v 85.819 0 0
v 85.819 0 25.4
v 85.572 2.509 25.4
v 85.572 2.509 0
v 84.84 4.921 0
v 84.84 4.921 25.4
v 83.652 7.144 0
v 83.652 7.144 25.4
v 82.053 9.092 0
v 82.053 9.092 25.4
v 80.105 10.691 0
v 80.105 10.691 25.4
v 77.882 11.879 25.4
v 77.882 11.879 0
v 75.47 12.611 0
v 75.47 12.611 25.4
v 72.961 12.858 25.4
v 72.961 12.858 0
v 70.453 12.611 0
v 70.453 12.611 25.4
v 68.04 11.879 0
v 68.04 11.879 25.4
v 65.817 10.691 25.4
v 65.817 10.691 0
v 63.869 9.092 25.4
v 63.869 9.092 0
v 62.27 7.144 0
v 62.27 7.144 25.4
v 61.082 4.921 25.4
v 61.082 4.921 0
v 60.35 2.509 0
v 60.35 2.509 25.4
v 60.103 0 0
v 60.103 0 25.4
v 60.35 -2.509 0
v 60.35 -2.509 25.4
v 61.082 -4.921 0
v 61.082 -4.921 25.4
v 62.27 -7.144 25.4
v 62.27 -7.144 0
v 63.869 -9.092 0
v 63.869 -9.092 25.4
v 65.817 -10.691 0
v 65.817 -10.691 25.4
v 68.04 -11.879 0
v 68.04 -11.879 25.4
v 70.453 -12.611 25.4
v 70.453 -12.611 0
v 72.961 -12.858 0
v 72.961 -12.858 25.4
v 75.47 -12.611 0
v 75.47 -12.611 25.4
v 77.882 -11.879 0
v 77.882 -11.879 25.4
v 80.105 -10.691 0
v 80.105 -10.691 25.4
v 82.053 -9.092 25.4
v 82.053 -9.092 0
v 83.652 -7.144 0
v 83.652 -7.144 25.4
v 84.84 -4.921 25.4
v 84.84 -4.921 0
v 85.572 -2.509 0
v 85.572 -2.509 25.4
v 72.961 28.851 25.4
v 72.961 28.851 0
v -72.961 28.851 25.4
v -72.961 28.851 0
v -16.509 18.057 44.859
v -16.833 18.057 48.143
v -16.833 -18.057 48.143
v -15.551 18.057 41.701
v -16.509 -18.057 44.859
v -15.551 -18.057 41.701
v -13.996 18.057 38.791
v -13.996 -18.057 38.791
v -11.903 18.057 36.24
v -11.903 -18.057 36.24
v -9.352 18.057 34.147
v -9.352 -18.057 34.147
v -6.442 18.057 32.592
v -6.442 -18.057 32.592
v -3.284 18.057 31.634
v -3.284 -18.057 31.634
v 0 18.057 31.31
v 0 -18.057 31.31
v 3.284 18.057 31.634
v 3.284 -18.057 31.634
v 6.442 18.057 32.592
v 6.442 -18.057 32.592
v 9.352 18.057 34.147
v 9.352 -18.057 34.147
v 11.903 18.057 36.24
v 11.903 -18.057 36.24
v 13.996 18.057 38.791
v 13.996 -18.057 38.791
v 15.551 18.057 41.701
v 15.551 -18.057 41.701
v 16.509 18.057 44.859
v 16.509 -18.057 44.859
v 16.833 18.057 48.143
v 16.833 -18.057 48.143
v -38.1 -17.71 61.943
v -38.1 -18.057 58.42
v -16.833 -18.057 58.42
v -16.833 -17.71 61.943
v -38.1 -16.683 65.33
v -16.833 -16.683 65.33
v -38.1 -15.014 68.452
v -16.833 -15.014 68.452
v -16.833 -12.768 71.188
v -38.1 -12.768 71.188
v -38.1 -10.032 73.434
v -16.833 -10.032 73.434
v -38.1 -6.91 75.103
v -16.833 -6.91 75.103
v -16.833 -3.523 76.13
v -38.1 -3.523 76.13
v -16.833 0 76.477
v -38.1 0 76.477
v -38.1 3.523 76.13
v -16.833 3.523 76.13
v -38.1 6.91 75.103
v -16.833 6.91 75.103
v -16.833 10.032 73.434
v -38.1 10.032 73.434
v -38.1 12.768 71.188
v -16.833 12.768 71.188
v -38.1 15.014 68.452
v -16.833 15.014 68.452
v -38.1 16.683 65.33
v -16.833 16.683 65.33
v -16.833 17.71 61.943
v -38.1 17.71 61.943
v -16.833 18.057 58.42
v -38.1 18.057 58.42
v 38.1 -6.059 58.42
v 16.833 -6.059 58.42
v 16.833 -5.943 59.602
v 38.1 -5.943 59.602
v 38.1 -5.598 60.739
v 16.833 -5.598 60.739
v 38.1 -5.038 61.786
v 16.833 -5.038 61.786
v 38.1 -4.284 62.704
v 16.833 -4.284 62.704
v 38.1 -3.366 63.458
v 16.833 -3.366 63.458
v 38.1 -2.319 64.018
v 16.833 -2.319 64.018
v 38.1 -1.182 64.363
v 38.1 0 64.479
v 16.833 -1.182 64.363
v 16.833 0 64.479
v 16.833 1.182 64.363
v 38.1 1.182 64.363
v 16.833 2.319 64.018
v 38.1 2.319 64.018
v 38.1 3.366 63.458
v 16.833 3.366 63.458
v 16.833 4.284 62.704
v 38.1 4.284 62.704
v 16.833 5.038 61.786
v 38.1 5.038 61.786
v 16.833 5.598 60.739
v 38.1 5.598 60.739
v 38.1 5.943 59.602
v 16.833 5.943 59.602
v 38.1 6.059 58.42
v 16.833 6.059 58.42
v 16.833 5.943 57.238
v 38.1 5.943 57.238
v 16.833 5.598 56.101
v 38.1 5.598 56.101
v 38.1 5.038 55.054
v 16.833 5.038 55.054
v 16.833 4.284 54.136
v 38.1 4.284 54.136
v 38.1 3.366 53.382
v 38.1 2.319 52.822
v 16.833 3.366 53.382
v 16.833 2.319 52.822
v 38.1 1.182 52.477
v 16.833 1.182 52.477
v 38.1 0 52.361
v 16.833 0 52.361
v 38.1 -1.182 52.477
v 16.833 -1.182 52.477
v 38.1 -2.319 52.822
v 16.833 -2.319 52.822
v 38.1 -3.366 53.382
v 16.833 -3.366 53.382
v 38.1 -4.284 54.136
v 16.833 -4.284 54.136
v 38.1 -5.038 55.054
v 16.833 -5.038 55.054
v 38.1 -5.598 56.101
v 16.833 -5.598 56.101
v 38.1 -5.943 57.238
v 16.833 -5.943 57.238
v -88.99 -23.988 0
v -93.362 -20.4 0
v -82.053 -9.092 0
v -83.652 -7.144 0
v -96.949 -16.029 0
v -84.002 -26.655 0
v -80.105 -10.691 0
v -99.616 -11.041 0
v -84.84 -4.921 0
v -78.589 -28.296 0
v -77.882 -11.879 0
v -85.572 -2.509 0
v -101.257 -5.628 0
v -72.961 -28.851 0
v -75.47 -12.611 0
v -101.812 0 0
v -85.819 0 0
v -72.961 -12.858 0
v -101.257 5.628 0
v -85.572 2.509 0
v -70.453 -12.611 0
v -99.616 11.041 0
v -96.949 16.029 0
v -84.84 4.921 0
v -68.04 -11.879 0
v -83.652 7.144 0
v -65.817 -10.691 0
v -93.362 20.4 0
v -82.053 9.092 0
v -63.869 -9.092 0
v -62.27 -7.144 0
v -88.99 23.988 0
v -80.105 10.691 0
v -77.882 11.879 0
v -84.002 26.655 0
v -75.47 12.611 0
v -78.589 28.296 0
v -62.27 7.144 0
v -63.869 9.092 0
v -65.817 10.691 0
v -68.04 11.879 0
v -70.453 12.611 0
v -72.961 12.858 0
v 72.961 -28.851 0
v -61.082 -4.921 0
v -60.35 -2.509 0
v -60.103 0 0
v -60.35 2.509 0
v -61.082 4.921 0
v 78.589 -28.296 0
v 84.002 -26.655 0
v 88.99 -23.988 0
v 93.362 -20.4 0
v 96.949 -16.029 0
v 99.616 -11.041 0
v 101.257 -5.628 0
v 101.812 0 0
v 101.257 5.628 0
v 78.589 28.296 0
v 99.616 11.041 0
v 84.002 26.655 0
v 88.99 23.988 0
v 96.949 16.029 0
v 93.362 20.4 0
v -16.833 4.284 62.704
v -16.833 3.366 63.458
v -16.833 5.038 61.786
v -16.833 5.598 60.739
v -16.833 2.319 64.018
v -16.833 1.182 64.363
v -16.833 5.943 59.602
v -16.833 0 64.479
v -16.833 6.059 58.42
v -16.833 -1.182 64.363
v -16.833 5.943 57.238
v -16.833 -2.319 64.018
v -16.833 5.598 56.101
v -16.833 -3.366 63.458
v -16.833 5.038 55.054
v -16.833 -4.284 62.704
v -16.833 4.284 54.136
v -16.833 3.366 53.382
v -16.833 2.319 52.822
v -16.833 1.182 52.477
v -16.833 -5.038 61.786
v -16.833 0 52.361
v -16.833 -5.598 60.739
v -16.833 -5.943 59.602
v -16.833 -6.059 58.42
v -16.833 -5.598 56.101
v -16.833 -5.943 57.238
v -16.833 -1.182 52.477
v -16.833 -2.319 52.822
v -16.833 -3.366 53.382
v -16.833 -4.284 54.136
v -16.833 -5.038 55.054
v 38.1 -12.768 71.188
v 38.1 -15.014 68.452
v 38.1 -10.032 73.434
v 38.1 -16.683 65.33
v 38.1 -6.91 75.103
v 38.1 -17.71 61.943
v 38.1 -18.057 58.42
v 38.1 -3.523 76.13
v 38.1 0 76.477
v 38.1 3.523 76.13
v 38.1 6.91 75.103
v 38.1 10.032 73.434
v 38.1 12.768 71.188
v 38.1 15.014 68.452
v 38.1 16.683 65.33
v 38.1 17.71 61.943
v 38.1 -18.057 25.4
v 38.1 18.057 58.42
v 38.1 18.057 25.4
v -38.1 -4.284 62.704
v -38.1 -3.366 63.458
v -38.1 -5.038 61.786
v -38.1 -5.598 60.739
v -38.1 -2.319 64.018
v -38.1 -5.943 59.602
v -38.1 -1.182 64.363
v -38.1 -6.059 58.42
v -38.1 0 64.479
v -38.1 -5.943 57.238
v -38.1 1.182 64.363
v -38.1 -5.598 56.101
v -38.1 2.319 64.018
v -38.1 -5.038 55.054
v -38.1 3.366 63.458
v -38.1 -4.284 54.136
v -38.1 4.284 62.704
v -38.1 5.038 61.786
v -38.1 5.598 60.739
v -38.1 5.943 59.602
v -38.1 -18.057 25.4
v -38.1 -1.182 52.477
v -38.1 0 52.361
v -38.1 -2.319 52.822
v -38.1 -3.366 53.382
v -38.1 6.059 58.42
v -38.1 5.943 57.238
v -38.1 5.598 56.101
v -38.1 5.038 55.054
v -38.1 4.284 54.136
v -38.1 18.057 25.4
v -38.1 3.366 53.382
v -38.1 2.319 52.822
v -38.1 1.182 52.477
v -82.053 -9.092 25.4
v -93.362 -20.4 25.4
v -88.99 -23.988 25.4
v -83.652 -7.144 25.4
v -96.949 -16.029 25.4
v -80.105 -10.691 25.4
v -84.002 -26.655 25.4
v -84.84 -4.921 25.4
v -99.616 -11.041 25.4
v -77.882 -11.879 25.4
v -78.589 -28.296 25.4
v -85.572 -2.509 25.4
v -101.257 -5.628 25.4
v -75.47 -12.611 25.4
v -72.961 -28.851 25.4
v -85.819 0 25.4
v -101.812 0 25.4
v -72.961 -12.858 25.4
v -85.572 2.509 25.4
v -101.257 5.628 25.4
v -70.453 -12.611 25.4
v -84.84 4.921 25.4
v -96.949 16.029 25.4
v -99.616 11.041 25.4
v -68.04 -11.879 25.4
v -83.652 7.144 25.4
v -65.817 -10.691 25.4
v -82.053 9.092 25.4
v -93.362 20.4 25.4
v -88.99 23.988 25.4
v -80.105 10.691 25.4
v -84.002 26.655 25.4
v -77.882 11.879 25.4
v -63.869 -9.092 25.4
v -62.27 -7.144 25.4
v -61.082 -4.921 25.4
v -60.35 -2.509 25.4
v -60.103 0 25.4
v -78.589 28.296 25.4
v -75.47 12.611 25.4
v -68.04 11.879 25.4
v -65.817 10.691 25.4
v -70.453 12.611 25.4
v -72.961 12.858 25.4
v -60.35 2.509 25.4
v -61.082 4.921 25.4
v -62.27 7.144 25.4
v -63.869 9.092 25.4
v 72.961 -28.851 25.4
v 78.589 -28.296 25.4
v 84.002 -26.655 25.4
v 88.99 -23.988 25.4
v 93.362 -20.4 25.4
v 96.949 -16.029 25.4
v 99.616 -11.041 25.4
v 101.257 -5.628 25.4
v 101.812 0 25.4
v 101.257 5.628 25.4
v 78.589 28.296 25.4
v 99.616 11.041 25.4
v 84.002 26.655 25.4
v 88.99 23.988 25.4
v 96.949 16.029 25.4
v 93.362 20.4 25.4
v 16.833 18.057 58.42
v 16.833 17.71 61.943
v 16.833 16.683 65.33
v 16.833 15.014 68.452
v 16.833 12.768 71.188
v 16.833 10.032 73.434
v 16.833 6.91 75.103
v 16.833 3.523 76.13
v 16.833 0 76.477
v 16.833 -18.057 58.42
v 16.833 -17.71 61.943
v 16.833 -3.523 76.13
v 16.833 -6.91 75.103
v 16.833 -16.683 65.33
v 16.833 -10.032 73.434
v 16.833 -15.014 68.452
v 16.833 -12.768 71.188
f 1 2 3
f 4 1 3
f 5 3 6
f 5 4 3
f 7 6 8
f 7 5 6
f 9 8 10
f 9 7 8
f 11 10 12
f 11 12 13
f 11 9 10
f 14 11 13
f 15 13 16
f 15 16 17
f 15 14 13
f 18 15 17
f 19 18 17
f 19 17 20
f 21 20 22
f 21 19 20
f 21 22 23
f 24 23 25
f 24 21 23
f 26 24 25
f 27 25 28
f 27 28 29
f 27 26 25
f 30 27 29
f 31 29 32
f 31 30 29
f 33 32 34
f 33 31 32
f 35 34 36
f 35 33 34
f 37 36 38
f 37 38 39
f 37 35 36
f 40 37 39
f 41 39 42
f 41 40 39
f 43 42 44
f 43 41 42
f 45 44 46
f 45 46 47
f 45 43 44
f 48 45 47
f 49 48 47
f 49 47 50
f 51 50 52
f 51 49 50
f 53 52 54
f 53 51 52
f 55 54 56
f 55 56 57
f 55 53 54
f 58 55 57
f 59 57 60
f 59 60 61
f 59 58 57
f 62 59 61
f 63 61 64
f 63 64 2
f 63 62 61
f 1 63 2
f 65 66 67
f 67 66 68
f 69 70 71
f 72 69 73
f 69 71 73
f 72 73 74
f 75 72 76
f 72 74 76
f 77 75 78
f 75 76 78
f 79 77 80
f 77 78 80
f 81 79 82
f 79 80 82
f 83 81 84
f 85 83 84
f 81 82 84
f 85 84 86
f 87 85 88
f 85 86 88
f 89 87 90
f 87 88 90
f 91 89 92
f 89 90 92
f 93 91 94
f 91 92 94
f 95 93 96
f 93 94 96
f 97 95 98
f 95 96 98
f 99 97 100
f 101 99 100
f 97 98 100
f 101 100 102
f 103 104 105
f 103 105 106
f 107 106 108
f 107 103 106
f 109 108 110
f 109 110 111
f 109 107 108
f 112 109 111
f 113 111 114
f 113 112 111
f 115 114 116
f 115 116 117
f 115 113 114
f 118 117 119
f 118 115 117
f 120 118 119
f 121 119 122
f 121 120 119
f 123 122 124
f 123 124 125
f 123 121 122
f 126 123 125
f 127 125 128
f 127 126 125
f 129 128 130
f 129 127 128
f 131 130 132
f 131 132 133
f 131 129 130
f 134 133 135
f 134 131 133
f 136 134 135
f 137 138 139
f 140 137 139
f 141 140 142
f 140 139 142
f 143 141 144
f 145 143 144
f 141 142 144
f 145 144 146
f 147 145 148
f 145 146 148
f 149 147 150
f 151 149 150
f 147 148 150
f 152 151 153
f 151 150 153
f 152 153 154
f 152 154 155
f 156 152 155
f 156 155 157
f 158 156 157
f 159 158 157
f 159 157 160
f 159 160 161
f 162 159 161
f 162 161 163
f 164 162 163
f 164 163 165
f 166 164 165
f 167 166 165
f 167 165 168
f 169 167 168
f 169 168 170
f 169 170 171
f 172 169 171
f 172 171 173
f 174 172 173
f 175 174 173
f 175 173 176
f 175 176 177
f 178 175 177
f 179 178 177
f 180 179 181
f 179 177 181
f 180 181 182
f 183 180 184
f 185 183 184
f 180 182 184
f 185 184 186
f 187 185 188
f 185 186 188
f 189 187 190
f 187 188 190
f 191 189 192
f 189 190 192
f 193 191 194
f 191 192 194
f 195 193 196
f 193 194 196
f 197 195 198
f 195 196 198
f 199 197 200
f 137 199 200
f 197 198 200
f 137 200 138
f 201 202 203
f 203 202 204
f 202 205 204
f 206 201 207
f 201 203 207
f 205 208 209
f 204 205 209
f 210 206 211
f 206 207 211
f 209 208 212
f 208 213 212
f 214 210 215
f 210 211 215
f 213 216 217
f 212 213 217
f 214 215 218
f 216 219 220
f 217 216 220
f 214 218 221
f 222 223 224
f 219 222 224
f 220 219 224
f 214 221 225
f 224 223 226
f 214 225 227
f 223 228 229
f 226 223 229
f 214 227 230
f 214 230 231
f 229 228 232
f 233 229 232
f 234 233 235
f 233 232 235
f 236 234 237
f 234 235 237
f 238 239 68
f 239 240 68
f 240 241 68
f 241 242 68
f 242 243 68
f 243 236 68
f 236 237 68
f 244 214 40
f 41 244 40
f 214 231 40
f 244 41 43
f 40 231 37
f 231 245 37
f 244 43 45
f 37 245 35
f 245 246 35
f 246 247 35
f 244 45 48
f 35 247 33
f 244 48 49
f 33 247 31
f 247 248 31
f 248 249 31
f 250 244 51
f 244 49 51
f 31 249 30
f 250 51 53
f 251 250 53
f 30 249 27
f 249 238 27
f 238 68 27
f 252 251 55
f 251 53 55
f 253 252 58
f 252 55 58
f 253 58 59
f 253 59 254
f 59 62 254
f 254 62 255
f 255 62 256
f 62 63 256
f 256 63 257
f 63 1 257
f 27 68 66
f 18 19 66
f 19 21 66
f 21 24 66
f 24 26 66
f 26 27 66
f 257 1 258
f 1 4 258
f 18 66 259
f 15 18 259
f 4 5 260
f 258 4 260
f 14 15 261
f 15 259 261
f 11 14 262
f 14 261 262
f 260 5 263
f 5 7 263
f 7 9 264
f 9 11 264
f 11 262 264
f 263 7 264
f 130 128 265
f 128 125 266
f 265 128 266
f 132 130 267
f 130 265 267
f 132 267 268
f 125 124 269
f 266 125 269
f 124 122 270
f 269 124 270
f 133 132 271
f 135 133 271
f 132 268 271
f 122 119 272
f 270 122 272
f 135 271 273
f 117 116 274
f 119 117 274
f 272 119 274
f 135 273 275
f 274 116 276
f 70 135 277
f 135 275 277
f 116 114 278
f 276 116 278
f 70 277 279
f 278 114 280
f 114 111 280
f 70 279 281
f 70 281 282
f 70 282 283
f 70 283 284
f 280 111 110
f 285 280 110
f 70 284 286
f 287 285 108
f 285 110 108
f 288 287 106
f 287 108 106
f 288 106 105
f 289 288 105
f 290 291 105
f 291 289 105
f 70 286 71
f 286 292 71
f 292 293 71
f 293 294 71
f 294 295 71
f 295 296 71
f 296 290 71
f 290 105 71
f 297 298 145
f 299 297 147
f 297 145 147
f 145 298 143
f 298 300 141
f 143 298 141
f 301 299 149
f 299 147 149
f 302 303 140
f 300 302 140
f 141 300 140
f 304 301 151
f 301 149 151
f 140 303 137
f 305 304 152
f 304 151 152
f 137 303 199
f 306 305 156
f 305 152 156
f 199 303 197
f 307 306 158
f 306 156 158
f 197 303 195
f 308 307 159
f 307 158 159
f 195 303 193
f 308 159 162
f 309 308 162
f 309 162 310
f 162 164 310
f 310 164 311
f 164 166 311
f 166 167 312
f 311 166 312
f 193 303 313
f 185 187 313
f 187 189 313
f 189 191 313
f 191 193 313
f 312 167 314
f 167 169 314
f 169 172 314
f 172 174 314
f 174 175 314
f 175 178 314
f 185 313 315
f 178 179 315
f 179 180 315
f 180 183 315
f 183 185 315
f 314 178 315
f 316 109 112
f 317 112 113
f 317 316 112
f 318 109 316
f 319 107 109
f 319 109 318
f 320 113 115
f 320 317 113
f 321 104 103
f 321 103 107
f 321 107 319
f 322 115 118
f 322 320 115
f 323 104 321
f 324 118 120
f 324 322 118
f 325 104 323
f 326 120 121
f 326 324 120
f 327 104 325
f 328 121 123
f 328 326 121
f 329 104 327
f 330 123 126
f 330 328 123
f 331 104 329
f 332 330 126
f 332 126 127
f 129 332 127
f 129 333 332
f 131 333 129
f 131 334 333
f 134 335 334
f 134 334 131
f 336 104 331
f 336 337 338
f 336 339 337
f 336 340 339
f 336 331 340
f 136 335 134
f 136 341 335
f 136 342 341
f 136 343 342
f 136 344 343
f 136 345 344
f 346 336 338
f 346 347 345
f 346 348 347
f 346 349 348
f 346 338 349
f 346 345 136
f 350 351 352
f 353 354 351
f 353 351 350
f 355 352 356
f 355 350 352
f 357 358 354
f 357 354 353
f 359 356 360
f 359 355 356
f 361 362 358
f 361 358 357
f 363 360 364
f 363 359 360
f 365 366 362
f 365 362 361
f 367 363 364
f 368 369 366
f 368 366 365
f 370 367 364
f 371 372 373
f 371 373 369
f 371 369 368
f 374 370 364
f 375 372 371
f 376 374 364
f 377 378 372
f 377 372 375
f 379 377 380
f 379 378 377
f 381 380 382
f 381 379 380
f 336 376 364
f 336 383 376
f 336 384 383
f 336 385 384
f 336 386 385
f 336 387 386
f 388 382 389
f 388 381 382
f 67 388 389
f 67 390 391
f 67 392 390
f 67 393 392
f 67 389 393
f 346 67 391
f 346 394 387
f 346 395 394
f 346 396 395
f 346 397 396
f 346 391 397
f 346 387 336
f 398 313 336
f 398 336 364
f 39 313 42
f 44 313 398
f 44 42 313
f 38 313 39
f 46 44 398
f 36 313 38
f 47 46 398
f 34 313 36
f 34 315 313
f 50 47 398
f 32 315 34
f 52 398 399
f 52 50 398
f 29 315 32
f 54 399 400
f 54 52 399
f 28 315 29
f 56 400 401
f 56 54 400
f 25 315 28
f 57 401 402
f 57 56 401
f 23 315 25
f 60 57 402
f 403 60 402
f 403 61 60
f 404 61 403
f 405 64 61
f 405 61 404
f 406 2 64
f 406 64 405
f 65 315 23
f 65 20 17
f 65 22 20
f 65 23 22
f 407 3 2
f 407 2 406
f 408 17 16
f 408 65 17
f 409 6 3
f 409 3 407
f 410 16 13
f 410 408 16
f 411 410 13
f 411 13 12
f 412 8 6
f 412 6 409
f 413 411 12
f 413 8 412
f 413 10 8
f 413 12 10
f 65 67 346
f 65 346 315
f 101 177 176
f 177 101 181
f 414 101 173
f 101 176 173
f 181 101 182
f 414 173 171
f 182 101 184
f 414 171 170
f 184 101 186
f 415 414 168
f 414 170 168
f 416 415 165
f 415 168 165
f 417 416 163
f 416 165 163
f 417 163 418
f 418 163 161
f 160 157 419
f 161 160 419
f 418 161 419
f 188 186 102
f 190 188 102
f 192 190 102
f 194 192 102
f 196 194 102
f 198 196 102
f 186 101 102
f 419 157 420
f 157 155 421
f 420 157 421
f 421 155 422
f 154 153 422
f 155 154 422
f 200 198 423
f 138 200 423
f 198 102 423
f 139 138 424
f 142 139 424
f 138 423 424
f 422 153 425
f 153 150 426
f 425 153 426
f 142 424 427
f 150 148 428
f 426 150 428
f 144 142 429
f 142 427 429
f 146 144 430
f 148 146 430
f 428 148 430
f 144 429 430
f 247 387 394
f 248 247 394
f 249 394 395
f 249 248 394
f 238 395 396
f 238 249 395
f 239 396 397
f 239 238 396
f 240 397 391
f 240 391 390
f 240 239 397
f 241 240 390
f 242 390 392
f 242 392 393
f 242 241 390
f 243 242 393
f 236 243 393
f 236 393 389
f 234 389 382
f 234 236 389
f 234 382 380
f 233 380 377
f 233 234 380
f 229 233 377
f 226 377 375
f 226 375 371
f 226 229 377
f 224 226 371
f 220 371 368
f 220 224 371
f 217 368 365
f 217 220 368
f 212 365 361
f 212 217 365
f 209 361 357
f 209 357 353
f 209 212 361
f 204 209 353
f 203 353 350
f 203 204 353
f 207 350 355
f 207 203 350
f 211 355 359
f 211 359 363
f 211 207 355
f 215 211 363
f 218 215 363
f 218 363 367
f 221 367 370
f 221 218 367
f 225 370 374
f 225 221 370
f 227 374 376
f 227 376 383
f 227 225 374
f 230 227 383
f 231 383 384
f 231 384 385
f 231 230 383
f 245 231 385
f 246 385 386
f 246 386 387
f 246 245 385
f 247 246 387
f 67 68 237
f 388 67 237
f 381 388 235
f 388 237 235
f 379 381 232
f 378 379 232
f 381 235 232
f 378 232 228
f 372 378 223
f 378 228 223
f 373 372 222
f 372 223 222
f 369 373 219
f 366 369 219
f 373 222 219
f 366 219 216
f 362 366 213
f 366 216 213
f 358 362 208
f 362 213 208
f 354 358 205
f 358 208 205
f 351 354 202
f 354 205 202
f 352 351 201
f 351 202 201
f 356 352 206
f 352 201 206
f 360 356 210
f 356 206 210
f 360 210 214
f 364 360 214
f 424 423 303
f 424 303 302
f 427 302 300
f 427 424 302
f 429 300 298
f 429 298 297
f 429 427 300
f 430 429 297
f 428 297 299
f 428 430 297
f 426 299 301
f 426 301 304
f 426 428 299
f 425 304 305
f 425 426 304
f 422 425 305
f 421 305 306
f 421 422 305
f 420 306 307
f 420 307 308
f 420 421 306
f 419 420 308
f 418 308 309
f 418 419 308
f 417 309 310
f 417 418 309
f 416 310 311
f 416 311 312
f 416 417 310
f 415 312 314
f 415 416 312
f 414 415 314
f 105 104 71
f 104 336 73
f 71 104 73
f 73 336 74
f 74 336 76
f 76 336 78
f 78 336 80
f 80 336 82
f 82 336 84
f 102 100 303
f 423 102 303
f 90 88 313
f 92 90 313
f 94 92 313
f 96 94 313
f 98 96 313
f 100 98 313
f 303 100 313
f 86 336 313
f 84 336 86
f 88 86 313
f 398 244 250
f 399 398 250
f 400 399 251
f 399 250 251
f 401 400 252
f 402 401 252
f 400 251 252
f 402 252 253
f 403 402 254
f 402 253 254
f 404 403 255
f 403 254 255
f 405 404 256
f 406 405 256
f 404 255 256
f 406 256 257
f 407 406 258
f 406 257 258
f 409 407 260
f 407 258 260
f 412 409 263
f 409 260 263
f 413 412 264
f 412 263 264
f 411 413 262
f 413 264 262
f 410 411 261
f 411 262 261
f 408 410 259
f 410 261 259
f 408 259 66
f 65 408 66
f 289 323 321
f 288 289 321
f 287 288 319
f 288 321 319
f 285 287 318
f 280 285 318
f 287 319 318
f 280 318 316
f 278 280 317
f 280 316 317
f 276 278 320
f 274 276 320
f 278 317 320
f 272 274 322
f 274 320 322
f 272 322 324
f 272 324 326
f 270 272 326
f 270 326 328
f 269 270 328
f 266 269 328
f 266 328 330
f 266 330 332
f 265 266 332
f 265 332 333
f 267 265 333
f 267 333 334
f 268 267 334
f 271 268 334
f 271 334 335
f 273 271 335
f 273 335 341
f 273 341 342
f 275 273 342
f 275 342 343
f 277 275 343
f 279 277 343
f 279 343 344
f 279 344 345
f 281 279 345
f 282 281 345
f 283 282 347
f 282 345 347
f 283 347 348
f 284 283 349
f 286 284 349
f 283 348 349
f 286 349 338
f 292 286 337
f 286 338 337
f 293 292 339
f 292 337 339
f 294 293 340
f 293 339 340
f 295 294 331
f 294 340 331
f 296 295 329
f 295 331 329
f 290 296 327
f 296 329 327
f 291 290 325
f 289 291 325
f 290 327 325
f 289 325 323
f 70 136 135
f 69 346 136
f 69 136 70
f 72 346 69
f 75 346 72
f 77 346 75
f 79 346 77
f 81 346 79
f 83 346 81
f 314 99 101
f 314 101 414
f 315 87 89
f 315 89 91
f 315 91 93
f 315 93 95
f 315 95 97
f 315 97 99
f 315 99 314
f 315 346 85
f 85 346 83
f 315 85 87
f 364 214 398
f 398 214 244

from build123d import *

# Parameters (mm, degrees)
F0_W     = 76.2
F0_H     = 36.11469
F1_DEPTH = 58.42
F0_R     = 12.858175
F2_DEPTH = 25.4
F3_R     = 6.059169
F4_DEPTH = 76.2
F5_DEPTH = 76.2
F7_DEPTH = 38.1


with BuildPart() as f1:
    # F0 (on Top) → F1 (new body)
    with BuildSketch(Plane.XY):
        Rectangle(F0_W, F0_H)
    extrude(amount=F1_DEPTH)

    # F0 (on Top) → F2 (join)
    with BuildSketch(Plane.XY):
        with BuildLine():
            Line((72.961012, 28.850658), (-72.961012, 28.850658))
            ThreePointArc((-72.961012, 28.850658), (-101.81167, 0), (-72.961012, -28.850658))
            Line((-72.961012, -28.850658), (72.961012, -28.850658))
            ThreePointArc((72.961012, -28.850658), (101.81167, 0), (72.961012, 28.850658))
        make_face()
        with Locations((-72.961012, 0)):
            Circle(F0_R, mode=Mode.SUBTRACT)
        Rectangle(F0_W, F0_H, mode=Mode.SUBTRACT)
        with Locations((72.961012, 0)):
            Circle(F0_R, mode=Mode.SUBTRACT)
    extrude(amount=F2_DEPTH)

    # F3 (on face) → F4 (join)
    with BuildSketch(Plane(origin=(-38.1, 0, 0), x_dir=(0, -1, 0), z_dir=(-1, 0, 0))):
        with Locations((0, 58.42)):
            Circle(F3_R)
        with BuildLine():
            Line((6.059169, 58.42), (18.057345, 58.42))
            ThreePointArc((18.057345, 58.42), (0, 76.477345), (-18.057345, 58.42))
            Line((-18.057345, 58.42), (-6.059169, 58.42))
            ThreePointArc((-6.059169, 58.42), (0, 64.479169), (6.059169, 58.42))
        make_face()
    extrude(amount=-F4_DEPTH)

    # F3 (on face) → F5 (cut)
    with BuildSketch(Plane(origin=(-38.1, 0, 0), x_dir=(0, -1, 0), z_dir=(-1, 0, 0))):
        with Locations((0, 58.42)):
            Circle(F3_R)
    extrude(amount=-F5_DEPTH, mode=Mode.SUBTRACT)

    # F6 (on Front) → F7 (cut, symmetric)
    with BuildSketch(Plane.XZ):
        with BuildLine():
            Line((16.832678, 103.529039), (-16.832678, 103.529039))
            Line((-16.832678, 103.529039), (-16.832678, 48.142973))
            ThreePointArc((-16.832678, 48.142973), (0, 31.310296), (16.832678, 48.142973))
            Line((16.832678, 48.142973), (16.832678, 103.529039))
        make_face()
    extrude(amount=F7_DEPTH, both=True, mode=Mode.SUBTRACT)


solid = f1.part
